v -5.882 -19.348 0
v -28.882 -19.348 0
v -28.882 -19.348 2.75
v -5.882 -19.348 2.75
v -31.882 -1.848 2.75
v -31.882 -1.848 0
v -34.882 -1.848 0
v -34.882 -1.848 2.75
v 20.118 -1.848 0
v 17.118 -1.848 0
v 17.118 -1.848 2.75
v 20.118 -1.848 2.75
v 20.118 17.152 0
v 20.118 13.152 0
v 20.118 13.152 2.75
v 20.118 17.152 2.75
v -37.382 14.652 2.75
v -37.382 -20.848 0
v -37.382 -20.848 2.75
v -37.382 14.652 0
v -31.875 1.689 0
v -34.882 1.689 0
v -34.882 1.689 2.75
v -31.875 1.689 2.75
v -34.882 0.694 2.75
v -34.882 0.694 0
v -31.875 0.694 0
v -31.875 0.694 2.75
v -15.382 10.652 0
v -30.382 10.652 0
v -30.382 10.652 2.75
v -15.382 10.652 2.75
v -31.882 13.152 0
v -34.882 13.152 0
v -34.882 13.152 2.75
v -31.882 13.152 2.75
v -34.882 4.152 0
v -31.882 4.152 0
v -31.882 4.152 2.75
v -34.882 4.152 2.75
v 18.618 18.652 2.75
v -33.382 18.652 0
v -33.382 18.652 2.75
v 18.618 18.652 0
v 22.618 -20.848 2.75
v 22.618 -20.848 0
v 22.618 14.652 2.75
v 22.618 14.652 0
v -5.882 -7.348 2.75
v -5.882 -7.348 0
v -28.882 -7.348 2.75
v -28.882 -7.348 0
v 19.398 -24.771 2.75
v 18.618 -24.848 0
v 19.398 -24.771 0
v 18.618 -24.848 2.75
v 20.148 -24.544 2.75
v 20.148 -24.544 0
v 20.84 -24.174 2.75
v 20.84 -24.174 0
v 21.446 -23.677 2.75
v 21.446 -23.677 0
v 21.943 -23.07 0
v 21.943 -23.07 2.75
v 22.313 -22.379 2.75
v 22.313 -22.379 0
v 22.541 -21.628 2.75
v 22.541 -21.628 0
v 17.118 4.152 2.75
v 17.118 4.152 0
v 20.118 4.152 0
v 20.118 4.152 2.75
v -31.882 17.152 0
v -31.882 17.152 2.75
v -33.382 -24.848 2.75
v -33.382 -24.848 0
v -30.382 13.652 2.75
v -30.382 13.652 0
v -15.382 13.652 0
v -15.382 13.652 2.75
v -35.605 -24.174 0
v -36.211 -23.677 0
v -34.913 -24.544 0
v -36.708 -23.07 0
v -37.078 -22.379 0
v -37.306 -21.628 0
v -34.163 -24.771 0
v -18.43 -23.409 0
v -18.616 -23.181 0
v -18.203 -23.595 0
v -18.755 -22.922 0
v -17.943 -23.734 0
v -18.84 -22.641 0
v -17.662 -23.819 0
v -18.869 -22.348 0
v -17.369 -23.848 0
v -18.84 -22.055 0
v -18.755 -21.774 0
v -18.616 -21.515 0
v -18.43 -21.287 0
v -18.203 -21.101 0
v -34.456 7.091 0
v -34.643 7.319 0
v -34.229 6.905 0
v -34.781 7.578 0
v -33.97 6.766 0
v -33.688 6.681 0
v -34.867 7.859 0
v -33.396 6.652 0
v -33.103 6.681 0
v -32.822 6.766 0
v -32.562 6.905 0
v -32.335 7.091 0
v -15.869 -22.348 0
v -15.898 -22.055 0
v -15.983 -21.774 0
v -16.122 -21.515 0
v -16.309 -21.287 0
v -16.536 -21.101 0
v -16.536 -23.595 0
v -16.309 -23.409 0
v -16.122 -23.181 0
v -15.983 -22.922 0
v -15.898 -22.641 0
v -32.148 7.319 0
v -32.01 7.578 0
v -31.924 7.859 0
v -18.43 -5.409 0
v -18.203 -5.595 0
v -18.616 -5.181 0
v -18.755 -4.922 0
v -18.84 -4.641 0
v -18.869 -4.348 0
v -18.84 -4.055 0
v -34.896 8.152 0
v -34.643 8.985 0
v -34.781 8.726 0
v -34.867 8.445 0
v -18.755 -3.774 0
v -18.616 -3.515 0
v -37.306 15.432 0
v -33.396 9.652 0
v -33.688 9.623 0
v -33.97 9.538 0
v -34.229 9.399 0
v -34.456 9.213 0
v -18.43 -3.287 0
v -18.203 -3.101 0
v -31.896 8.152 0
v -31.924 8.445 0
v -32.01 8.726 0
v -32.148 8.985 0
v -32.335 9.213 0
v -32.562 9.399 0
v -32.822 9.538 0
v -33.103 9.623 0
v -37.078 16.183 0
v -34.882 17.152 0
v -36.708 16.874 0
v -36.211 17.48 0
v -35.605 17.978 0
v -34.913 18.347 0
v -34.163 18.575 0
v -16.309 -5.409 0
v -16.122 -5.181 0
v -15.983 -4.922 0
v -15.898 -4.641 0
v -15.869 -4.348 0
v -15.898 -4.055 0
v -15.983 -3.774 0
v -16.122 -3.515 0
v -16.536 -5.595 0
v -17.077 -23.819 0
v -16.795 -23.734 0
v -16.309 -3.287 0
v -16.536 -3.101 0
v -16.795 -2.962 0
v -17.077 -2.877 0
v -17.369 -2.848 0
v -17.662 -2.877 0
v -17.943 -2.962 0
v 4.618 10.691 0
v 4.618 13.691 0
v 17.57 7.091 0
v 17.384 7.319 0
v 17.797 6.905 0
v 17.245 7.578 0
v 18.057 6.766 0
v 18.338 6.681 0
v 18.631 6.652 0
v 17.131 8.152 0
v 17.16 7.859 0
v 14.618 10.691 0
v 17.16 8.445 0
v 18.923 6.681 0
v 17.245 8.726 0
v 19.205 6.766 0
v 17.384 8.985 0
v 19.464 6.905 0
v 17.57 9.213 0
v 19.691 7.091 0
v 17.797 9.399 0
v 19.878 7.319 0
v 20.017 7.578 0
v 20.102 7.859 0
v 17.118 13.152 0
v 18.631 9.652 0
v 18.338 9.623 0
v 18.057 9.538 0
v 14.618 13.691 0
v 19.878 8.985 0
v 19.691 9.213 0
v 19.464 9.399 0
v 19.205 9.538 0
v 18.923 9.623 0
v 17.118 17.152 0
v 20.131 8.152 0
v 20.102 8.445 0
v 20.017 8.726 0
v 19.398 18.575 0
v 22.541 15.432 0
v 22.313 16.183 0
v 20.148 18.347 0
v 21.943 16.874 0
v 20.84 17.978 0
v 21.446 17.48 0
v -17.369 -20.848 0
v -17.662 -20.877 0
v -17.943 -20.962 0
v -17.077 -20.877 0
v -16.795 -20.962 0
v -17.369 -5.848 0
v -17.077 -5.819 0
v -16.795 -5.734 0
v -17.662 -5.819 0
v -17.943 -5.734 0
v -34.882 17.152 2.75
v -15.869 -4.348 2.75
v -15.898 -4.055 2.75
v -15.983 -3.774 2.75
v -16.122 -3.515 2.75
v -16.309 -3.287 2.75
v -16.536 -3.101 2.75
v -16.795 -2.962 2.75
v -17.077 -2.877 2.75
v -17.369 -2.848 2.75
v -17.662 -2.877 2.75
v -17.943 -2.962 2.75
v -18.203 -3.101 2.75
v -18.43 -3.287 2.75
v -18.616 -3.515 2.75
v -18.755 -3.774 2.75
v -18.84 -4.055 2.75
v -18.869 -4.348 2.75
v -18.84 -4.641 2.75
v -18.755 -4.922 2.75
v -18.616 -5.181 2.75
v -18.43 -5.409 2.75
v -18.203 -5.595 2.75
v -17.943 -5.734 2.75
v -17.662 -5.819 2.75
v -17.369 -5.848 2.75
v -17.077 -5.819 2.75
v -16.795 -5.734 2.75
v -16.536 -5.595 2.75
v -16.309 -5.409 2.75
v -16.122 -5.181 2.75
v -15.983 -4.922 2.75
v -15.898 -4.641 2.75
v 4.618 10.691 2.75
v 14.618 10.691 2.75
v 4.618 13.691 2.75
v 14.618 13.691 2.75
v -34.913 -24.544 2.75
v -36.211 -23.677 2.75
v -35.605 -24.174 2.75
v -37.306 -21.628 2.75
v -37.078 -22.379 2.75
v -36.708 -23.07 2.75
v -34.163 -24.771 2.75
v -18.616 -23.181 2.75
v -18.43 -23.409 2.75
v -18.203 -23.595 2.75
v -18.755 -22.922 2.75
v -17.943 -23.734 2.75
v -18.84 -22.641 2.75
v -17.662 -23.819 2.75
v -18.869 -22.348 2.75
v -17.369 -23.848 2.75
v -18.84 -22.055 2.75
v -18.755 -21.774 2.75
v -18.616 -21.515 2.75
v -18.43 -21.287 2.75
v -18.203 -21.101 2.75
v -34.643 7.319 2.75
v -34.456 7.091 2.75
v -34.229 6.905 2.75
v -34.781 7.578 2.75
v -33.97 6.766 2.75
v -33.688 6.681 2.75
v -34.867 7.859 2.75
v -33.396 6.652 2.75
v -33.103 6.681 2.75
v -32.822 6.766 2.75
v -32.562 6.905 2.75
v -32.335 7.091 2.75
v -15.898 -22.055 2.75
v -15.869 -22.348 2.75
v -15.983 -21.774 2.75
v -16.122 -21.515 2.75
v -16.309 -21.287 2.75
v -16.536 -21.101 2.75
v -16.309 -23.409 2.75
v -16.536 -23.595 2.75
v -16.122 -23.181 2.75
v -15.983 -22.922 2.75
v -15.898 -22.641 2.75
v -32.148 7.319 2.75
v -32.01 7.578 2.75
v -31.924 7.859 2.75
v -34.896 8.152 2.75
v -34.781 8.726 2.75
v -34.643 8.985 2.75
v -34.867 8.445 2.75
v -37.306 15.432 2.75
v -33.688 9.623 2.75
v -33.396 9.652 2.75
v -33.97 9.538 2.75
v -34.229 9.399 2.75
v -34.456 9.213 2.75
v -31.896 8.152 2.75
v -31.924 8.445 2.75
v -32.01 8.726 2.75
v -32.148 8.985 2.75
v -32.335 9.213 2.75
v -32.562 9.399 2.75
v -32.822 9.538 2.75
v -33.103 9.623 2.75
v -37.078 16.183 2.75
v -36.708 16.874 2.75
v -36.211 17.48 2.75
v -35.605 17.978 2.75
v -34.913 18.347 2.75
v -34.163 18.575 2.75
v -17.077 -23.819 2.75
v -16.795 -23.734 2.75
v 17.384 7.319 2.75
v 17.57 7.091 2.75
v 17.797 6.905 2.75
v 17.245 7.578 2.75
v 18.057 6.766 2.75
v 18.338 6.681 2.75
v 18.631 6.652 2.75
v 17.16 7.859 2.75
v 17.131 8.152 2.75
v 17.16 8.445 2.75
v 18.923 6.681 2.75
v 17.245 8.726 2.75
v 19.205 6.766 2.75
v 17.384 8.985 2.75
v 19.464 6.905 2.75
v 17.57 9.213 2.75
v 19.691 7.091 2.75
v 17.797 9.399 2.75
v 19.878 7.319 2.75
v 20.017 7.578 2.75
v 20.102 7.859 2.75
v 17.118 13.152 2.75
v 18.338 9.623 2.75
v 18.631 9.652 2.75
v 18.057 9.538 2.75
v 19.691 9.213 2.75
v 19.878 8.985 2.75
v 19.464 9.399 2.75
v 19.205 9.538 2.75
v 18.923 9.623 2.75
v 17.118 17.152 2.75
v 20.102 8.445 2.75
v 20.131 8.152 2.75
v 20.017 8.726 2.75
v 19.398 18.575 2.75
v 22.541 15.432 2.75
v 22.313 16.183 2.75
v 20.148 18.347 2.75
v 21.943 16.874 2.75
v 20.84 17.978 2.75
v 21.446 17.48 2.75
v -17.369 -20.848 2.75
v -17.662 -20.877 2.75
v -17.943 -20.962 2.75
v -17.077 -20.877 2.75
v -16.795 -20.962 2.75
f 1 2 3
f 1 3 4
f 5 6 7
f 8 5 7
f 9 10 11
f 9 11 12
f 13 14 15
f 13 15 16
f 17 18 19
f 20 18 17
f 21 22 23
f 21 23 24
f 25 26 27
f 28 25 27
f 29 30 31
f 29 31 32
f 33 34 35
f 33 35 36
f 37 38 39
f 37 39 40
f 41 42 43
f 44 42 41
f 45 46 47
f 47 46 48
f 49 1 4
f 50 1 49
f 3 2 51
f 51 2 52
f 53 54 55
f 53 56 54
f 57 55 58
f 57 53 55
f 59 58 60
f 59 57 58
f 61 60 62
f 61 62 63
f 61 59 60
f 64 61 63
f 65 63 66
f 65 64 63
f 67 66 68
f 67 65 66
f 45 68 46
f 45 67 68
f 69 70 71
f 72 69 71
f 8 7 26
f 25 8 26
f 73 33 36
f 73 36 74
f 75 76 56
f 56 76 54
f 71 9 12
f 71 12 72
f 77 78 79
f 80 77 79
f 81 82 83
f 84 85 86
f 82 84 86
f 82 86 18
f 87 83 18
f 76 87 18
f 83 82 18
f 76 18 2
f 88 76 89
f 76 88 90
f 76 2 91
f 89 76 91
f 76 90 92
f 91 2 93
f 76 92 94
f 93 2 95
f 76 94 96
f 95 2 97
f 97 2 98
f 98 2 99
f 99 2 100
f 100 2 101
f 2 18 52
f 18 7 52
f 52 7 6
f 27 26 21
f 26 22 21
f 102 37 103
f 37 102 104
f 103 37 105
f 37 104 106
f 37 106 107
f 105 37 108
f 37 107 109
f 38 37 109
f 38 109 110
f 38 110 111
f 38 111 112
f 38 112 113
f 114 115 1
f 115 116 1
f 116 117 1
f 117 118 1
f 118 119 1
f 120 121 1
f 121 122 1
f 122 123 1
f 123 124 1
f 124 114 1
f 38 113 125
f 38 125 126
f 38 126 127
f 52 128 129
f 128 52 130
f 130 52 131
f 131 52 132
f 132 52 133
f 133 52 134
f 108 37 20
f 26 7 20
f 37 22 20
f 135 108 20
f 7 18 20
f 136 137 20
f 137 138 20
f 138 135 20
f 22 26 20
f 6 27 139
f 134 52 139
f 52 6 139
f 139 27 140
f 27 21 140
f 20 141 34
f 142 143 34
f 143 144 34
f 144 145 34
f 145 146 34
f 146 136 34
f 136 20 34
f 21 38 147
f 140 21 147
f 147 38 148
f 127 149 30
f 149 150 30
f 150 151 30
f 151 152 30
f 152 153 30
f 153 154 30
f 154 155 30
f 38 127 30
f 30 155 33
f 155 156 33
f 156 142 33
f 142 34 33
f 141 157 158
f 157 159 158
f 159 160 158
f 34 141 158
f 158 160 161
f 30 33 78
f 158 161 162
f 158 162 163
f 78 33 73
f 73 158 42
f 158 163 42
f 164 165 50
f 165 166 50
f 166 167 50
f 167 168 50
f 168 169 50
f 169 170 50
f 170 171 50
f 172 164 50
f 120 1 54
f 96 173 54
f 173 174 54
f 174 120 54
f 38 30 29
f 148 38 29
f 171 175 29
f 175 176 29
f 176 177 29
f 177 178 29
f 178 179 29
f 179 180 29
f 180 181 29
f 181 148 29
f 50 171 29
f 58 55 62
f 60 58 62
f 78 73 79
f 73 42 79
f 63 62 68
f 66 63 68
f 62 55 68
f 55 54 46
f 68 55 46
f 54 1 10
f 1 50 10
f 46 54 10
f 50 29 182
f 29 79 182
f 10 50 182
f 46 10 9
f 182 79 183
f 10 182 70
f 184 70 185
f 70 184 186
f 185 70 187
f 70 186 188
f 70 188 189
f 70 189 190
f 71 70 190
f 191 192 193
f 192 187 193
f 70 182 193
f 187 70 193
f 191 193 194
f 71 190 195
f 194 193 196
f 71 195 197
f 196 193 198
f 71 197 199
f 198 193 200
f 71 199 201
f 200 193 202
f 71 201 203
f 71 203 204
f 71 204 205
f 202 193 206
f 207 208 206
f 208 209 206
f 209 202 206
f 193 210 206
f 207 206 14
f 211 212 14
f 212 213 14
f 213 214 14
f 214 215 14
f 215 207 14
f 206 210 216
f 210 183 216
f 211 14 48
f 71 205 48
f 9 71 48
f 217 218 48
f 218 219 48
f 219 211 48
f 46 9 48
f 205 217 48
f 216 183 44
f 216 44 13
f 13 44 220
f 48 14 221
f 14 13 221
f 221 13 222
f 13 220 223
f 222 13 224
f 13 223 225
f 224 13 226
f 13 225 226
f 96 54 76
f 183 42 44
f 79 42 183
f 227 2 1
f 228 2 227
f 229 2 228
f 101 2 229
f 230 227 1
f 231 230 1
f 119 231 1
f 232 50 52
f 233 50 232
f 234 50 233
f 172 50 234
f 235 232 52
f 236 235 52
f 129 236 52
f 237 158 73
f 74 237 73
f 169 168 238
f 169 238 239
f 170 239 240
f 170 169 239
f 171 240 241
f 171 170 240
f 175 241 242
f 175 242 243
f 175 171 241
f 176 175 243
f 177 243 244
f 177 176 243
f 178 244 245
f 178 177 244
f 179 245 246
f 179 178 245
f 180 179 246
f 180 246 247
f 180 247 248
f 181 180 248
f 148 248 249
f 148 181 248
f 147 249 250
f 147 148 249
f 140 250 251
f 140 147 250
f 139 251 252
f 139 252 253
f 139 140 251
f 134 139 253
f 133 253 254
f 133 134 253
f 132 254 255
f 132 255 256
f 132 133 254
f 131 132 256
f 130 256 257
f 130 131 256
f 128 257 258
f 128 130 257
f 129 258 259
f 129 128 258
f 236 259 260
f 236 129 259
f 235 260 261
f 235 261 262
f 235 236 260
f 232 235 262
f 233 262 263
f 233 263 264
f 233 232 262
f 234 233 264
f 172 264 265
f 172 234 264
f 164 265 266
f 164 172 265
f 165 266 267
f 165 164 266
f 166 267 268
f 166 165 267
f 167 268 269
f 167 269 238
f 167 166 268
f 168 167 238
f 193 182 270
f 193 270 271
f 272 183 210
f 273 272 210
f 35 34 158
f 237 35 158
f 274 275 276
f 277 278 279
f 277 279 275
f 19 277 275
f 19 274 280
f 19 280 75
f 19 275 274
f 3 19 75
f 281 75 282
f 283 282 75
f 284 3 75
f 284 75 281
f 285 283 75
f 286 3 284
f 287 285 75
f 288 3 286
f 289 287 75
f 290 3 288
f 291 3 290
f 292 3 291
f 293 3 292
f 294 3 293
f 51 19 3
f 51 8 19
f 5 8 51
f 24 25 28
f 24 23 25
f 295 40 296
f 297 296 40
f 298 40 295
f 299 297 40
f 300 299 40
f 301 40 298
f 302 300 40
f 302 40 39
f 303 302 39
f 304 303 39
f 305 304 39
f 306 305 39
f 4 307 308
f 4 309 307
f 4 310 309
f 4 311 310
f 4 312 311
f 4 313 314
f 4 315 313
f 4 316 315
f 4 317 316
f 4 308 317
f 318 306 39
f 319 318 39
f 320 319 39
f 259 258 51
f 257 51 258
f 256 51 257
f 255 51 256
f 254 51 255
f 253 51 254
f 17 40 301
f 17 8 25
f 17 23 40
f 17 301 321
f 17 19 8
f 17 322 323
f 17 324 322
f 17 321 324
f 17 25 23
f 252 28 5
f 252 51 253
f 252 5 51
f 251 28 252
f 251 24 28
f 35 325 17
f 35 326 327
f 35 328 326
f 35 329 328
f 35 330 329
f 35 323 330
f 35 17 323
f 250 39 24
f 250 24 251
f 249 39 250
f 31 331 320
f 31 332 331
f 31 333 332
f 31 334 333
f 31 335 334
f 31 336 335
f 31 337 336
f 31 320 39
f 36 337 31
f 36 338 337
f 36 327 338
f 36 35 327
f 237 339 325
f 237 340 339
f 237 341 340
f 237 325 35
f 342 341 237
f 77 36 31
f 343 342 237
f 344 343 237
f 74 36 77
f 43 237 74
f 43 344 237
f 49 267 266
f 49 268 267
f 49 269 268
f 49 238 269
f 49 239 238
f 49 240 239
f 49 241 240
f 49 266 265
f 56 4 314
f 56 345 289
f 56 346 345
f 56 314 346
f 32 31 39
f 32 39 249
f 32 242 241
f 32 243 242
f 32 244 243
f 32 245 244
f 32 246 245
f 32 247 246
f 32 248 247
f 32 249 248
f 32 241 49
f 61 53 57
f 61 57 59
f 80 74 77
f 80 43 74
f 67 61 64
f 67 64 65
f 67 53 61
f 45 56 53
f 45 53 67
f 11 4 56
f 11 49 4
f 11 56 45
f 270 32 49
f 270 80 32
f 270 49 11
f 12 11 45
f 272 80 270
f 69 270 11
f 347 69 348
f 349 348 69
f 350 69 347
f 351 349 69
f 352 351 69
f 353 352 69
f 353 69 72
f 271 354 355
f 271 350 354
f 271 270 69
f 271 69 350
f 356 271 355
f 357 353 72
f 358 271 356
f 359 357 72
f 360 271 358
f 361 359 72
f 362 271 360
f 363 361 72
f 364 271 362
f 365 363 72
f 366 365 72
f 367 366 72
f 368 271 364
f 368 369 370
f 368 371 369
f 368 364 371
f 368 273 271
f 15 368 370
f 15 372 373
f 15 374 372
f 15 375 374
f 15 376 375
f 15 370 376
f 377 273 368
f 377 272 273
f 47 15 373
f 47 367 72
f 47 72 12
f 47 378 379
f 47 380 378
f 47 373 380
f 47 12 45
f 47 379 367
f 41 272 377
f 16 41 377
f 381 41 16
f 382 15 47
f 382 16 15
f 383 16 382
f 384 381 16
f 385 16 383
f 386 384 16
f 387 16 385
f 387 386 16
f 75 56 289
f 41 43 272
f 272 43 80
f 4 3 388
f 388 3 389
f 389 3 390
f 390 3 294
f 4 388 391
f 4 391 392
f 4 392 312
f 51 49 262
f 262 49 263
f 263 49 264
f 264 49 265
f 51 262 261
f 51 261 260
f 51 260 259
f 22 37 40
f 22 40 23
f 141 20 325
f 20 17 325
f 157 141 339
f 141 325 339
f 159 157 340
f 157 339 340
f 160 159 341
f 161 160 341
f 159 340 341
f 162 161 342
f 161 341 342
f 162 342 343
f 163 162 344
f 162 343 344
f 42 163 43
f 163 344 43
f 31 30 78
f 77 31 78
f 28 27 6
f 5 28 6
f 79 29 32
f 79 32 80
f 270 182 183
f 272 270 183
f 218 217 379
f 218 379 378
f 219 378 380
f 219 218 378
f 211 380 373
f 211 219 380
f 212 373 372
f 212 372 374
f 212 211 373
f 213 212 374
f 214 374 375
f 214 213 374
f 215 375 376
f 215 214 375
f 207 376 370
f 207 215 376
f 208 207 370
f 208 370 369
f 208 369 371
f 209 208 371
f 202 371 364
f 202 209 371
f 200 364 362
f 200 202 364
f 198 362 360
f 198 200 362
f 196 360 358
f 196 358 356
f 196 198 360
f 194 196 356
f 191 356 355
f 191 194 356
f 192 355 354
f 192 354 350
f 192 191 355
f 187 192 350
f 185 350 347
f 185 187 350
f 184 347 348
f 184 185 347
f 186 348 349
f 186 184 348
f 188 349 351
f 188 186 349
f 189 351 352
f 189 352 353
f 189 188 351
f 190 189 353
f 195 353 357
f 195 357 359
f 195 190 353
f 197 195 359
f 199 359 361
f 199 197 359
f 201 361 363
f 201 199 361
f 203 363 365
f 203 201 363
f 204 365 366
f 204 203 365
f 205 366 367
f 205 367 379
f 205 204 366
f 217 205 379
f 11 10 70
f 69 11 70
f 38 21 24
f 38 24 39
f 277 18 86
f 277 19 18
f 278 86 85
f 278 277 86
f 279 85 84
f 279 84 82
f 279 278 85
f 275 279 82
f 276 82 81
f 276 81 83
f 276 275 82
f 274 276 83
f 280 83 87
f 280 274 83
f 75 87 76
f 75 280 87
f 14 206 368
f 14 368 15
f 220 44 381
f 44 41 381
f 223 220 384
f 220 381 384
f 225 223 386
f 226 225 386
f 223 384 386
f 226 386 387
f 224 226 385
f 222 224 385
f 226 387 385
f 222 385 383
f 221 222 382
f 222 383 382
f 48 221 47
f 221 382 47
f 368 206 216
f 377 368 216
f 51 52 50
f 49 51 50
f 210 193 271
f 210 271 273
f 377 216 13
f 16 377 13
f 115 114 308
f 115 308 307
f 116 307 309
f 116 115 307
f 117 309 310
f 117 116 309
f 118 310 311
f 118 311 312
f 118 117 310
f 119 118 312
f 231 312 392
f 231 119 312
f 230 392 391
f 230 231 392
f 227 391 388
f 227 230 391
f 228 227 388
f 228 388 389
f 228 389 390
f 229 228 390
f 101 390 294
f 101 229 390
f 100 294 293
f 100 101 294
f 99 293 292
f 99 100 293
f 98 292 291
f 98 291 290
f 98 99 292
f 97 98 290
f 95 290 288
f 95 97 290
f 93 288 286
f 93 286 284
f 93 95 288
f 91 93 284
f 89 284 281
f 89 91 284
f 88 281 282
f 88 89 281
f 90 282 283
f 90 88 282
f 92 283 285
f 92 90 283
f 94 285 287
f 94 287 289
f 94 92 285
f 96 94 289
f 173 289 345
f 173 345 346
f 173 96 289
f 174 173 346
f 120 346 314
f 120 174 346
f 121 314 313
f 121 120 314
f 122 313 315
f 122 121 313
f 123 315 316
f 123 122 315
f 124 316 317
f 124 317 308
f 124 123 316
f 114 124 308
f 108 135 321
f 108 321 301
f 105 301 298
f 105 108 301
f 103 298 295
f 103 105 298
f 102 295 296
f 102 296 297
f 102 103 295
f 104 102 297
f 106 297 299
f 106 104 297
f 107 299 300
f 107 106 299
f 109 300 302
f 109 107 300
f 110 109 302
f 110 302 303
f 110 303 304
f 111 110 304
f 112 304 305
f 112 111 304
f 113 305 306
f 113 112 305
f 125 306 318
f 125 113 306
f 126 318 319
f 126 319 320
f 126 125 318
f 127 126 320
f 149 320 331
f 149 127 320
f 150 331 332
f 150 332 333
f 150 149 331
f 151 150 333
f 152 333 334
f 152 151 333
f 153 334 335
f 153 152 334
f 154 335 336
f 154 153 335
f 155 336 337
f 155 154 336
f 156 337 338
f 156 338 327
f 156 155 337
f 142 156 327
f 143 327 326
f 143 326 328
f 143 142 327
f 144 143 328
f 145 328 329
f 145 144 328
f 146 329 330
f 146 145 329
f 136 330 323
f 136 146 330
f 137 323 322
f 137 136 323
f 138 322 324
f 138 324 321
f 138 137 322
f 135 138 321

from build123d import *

# Parameters (mm, degrees)
SKETCH1_W           = 60
SKETCH1_H           = 43.5
SKETCH1_R           = 1.5
SKETCH1_W_2         = 23
SKETCH1_H_2         = 12
SKETCH1_W_3         = 15
SKETCH1_H_3         = 3
SKETCH1_W_4         = 10
SKETCH1_W_5         = 3
SKETCH1_H_4         = 6
SKETCH1_H_5         = 4
BOSS_EXTRUDE1_DEPTH = 2.75
FILLET1_R           = 4


with BuildPart() as part:
    # Sketch1 → Boss-Extrude1 (new body)
    with BuildSketch(Plane.XY):
        with Locations((-7.382405678, -3.098084383)):
            Rectangle(SKETCH1_W, SKETCH1_H)
        with Locations((-17.369283231, -22.348084383)):
            Circle(SKETCH1_R, mode=Mode.SUBTRACT)
        with Locations((-17.369283231, -4.348084383)):
            Circle(SKETCH1_R, mode=Mode.SUBTRACT)
        with Locations((18.630716769, 8.151915617)):
            Circle(SKETCH1_R, mode=Mode.SUBTRACT)
        with Locations(Location((-33.395528126, 8.151915617, 0), (0, 0, 180))):
            Circle(SKETCH1_R, mode=Mode.SUBTRACT)
        with Locations((-17.382405678, -13.348084383)):
            Rectangle(SKETCH1_W_2, SKETCH1_H_2, mode=Mode.SUBTRACT)
        with Locations((-22.882405678, 12.151915617)):
            Rectangle(SKETCH1_W_3, SKETCH1_H_3, mode=Mode.SUBTRACT)
        with Locations((9.617594322, 12.191282959)):
            Rectangle(SKETCH1_W_4, SKETCH1_H_3, mode=Mode.SUBTRACT)
        with Locations((18.617594322, 1.151915617)):
            Rectangle(SKETCH1_W_5, SKETCH1_H_4, mode=Mode.SUBTRACT)
        with Locations((18.617594322, 15.151915617)):
            Rectangle(SKETCH1_W_5, SKETCH1_H_5, mode=Mode.SUBTRACT)
        Polygon((-31.882405678, 4.151915617), (-34.882405678, 4.151915617), (-34.882405678, 1.688906326), (-31.8745626, 1.688906326), align=None, mode=Mode.SUBTRACT)
        Polygon((-34.882405678, -1.848084383), (-34.882405678, 0.693659593), (-31.8745626, 0.693659593), (-31.882405678, -1.848084383), align=None, mode=Mode.SUBTRACT)
        with Locations((-33.382405678, 15.151915617)):
            Rectangle(SKETCH1_W_5, SKETCH1_H_5, mode=Mode.SUBTRACT)
    extrude(amount=BOSS_EXTRUDE1_DEPTH)

    # Fillet1
    fillet1_edges = [part.edges().sort_by_distance(p)[0] for p in [
        (22.617594322, -24.848084383, 1.375),
        (-37.382405678, -24.848084383, 1.375),
        (-37.382405678, 18.651915617, 1.375),
        (22.617594322, 18.651915617, 1.375),
    ]]
    fillet(fillet1_edges, radius=FILLET1_R)


solid = part.part
